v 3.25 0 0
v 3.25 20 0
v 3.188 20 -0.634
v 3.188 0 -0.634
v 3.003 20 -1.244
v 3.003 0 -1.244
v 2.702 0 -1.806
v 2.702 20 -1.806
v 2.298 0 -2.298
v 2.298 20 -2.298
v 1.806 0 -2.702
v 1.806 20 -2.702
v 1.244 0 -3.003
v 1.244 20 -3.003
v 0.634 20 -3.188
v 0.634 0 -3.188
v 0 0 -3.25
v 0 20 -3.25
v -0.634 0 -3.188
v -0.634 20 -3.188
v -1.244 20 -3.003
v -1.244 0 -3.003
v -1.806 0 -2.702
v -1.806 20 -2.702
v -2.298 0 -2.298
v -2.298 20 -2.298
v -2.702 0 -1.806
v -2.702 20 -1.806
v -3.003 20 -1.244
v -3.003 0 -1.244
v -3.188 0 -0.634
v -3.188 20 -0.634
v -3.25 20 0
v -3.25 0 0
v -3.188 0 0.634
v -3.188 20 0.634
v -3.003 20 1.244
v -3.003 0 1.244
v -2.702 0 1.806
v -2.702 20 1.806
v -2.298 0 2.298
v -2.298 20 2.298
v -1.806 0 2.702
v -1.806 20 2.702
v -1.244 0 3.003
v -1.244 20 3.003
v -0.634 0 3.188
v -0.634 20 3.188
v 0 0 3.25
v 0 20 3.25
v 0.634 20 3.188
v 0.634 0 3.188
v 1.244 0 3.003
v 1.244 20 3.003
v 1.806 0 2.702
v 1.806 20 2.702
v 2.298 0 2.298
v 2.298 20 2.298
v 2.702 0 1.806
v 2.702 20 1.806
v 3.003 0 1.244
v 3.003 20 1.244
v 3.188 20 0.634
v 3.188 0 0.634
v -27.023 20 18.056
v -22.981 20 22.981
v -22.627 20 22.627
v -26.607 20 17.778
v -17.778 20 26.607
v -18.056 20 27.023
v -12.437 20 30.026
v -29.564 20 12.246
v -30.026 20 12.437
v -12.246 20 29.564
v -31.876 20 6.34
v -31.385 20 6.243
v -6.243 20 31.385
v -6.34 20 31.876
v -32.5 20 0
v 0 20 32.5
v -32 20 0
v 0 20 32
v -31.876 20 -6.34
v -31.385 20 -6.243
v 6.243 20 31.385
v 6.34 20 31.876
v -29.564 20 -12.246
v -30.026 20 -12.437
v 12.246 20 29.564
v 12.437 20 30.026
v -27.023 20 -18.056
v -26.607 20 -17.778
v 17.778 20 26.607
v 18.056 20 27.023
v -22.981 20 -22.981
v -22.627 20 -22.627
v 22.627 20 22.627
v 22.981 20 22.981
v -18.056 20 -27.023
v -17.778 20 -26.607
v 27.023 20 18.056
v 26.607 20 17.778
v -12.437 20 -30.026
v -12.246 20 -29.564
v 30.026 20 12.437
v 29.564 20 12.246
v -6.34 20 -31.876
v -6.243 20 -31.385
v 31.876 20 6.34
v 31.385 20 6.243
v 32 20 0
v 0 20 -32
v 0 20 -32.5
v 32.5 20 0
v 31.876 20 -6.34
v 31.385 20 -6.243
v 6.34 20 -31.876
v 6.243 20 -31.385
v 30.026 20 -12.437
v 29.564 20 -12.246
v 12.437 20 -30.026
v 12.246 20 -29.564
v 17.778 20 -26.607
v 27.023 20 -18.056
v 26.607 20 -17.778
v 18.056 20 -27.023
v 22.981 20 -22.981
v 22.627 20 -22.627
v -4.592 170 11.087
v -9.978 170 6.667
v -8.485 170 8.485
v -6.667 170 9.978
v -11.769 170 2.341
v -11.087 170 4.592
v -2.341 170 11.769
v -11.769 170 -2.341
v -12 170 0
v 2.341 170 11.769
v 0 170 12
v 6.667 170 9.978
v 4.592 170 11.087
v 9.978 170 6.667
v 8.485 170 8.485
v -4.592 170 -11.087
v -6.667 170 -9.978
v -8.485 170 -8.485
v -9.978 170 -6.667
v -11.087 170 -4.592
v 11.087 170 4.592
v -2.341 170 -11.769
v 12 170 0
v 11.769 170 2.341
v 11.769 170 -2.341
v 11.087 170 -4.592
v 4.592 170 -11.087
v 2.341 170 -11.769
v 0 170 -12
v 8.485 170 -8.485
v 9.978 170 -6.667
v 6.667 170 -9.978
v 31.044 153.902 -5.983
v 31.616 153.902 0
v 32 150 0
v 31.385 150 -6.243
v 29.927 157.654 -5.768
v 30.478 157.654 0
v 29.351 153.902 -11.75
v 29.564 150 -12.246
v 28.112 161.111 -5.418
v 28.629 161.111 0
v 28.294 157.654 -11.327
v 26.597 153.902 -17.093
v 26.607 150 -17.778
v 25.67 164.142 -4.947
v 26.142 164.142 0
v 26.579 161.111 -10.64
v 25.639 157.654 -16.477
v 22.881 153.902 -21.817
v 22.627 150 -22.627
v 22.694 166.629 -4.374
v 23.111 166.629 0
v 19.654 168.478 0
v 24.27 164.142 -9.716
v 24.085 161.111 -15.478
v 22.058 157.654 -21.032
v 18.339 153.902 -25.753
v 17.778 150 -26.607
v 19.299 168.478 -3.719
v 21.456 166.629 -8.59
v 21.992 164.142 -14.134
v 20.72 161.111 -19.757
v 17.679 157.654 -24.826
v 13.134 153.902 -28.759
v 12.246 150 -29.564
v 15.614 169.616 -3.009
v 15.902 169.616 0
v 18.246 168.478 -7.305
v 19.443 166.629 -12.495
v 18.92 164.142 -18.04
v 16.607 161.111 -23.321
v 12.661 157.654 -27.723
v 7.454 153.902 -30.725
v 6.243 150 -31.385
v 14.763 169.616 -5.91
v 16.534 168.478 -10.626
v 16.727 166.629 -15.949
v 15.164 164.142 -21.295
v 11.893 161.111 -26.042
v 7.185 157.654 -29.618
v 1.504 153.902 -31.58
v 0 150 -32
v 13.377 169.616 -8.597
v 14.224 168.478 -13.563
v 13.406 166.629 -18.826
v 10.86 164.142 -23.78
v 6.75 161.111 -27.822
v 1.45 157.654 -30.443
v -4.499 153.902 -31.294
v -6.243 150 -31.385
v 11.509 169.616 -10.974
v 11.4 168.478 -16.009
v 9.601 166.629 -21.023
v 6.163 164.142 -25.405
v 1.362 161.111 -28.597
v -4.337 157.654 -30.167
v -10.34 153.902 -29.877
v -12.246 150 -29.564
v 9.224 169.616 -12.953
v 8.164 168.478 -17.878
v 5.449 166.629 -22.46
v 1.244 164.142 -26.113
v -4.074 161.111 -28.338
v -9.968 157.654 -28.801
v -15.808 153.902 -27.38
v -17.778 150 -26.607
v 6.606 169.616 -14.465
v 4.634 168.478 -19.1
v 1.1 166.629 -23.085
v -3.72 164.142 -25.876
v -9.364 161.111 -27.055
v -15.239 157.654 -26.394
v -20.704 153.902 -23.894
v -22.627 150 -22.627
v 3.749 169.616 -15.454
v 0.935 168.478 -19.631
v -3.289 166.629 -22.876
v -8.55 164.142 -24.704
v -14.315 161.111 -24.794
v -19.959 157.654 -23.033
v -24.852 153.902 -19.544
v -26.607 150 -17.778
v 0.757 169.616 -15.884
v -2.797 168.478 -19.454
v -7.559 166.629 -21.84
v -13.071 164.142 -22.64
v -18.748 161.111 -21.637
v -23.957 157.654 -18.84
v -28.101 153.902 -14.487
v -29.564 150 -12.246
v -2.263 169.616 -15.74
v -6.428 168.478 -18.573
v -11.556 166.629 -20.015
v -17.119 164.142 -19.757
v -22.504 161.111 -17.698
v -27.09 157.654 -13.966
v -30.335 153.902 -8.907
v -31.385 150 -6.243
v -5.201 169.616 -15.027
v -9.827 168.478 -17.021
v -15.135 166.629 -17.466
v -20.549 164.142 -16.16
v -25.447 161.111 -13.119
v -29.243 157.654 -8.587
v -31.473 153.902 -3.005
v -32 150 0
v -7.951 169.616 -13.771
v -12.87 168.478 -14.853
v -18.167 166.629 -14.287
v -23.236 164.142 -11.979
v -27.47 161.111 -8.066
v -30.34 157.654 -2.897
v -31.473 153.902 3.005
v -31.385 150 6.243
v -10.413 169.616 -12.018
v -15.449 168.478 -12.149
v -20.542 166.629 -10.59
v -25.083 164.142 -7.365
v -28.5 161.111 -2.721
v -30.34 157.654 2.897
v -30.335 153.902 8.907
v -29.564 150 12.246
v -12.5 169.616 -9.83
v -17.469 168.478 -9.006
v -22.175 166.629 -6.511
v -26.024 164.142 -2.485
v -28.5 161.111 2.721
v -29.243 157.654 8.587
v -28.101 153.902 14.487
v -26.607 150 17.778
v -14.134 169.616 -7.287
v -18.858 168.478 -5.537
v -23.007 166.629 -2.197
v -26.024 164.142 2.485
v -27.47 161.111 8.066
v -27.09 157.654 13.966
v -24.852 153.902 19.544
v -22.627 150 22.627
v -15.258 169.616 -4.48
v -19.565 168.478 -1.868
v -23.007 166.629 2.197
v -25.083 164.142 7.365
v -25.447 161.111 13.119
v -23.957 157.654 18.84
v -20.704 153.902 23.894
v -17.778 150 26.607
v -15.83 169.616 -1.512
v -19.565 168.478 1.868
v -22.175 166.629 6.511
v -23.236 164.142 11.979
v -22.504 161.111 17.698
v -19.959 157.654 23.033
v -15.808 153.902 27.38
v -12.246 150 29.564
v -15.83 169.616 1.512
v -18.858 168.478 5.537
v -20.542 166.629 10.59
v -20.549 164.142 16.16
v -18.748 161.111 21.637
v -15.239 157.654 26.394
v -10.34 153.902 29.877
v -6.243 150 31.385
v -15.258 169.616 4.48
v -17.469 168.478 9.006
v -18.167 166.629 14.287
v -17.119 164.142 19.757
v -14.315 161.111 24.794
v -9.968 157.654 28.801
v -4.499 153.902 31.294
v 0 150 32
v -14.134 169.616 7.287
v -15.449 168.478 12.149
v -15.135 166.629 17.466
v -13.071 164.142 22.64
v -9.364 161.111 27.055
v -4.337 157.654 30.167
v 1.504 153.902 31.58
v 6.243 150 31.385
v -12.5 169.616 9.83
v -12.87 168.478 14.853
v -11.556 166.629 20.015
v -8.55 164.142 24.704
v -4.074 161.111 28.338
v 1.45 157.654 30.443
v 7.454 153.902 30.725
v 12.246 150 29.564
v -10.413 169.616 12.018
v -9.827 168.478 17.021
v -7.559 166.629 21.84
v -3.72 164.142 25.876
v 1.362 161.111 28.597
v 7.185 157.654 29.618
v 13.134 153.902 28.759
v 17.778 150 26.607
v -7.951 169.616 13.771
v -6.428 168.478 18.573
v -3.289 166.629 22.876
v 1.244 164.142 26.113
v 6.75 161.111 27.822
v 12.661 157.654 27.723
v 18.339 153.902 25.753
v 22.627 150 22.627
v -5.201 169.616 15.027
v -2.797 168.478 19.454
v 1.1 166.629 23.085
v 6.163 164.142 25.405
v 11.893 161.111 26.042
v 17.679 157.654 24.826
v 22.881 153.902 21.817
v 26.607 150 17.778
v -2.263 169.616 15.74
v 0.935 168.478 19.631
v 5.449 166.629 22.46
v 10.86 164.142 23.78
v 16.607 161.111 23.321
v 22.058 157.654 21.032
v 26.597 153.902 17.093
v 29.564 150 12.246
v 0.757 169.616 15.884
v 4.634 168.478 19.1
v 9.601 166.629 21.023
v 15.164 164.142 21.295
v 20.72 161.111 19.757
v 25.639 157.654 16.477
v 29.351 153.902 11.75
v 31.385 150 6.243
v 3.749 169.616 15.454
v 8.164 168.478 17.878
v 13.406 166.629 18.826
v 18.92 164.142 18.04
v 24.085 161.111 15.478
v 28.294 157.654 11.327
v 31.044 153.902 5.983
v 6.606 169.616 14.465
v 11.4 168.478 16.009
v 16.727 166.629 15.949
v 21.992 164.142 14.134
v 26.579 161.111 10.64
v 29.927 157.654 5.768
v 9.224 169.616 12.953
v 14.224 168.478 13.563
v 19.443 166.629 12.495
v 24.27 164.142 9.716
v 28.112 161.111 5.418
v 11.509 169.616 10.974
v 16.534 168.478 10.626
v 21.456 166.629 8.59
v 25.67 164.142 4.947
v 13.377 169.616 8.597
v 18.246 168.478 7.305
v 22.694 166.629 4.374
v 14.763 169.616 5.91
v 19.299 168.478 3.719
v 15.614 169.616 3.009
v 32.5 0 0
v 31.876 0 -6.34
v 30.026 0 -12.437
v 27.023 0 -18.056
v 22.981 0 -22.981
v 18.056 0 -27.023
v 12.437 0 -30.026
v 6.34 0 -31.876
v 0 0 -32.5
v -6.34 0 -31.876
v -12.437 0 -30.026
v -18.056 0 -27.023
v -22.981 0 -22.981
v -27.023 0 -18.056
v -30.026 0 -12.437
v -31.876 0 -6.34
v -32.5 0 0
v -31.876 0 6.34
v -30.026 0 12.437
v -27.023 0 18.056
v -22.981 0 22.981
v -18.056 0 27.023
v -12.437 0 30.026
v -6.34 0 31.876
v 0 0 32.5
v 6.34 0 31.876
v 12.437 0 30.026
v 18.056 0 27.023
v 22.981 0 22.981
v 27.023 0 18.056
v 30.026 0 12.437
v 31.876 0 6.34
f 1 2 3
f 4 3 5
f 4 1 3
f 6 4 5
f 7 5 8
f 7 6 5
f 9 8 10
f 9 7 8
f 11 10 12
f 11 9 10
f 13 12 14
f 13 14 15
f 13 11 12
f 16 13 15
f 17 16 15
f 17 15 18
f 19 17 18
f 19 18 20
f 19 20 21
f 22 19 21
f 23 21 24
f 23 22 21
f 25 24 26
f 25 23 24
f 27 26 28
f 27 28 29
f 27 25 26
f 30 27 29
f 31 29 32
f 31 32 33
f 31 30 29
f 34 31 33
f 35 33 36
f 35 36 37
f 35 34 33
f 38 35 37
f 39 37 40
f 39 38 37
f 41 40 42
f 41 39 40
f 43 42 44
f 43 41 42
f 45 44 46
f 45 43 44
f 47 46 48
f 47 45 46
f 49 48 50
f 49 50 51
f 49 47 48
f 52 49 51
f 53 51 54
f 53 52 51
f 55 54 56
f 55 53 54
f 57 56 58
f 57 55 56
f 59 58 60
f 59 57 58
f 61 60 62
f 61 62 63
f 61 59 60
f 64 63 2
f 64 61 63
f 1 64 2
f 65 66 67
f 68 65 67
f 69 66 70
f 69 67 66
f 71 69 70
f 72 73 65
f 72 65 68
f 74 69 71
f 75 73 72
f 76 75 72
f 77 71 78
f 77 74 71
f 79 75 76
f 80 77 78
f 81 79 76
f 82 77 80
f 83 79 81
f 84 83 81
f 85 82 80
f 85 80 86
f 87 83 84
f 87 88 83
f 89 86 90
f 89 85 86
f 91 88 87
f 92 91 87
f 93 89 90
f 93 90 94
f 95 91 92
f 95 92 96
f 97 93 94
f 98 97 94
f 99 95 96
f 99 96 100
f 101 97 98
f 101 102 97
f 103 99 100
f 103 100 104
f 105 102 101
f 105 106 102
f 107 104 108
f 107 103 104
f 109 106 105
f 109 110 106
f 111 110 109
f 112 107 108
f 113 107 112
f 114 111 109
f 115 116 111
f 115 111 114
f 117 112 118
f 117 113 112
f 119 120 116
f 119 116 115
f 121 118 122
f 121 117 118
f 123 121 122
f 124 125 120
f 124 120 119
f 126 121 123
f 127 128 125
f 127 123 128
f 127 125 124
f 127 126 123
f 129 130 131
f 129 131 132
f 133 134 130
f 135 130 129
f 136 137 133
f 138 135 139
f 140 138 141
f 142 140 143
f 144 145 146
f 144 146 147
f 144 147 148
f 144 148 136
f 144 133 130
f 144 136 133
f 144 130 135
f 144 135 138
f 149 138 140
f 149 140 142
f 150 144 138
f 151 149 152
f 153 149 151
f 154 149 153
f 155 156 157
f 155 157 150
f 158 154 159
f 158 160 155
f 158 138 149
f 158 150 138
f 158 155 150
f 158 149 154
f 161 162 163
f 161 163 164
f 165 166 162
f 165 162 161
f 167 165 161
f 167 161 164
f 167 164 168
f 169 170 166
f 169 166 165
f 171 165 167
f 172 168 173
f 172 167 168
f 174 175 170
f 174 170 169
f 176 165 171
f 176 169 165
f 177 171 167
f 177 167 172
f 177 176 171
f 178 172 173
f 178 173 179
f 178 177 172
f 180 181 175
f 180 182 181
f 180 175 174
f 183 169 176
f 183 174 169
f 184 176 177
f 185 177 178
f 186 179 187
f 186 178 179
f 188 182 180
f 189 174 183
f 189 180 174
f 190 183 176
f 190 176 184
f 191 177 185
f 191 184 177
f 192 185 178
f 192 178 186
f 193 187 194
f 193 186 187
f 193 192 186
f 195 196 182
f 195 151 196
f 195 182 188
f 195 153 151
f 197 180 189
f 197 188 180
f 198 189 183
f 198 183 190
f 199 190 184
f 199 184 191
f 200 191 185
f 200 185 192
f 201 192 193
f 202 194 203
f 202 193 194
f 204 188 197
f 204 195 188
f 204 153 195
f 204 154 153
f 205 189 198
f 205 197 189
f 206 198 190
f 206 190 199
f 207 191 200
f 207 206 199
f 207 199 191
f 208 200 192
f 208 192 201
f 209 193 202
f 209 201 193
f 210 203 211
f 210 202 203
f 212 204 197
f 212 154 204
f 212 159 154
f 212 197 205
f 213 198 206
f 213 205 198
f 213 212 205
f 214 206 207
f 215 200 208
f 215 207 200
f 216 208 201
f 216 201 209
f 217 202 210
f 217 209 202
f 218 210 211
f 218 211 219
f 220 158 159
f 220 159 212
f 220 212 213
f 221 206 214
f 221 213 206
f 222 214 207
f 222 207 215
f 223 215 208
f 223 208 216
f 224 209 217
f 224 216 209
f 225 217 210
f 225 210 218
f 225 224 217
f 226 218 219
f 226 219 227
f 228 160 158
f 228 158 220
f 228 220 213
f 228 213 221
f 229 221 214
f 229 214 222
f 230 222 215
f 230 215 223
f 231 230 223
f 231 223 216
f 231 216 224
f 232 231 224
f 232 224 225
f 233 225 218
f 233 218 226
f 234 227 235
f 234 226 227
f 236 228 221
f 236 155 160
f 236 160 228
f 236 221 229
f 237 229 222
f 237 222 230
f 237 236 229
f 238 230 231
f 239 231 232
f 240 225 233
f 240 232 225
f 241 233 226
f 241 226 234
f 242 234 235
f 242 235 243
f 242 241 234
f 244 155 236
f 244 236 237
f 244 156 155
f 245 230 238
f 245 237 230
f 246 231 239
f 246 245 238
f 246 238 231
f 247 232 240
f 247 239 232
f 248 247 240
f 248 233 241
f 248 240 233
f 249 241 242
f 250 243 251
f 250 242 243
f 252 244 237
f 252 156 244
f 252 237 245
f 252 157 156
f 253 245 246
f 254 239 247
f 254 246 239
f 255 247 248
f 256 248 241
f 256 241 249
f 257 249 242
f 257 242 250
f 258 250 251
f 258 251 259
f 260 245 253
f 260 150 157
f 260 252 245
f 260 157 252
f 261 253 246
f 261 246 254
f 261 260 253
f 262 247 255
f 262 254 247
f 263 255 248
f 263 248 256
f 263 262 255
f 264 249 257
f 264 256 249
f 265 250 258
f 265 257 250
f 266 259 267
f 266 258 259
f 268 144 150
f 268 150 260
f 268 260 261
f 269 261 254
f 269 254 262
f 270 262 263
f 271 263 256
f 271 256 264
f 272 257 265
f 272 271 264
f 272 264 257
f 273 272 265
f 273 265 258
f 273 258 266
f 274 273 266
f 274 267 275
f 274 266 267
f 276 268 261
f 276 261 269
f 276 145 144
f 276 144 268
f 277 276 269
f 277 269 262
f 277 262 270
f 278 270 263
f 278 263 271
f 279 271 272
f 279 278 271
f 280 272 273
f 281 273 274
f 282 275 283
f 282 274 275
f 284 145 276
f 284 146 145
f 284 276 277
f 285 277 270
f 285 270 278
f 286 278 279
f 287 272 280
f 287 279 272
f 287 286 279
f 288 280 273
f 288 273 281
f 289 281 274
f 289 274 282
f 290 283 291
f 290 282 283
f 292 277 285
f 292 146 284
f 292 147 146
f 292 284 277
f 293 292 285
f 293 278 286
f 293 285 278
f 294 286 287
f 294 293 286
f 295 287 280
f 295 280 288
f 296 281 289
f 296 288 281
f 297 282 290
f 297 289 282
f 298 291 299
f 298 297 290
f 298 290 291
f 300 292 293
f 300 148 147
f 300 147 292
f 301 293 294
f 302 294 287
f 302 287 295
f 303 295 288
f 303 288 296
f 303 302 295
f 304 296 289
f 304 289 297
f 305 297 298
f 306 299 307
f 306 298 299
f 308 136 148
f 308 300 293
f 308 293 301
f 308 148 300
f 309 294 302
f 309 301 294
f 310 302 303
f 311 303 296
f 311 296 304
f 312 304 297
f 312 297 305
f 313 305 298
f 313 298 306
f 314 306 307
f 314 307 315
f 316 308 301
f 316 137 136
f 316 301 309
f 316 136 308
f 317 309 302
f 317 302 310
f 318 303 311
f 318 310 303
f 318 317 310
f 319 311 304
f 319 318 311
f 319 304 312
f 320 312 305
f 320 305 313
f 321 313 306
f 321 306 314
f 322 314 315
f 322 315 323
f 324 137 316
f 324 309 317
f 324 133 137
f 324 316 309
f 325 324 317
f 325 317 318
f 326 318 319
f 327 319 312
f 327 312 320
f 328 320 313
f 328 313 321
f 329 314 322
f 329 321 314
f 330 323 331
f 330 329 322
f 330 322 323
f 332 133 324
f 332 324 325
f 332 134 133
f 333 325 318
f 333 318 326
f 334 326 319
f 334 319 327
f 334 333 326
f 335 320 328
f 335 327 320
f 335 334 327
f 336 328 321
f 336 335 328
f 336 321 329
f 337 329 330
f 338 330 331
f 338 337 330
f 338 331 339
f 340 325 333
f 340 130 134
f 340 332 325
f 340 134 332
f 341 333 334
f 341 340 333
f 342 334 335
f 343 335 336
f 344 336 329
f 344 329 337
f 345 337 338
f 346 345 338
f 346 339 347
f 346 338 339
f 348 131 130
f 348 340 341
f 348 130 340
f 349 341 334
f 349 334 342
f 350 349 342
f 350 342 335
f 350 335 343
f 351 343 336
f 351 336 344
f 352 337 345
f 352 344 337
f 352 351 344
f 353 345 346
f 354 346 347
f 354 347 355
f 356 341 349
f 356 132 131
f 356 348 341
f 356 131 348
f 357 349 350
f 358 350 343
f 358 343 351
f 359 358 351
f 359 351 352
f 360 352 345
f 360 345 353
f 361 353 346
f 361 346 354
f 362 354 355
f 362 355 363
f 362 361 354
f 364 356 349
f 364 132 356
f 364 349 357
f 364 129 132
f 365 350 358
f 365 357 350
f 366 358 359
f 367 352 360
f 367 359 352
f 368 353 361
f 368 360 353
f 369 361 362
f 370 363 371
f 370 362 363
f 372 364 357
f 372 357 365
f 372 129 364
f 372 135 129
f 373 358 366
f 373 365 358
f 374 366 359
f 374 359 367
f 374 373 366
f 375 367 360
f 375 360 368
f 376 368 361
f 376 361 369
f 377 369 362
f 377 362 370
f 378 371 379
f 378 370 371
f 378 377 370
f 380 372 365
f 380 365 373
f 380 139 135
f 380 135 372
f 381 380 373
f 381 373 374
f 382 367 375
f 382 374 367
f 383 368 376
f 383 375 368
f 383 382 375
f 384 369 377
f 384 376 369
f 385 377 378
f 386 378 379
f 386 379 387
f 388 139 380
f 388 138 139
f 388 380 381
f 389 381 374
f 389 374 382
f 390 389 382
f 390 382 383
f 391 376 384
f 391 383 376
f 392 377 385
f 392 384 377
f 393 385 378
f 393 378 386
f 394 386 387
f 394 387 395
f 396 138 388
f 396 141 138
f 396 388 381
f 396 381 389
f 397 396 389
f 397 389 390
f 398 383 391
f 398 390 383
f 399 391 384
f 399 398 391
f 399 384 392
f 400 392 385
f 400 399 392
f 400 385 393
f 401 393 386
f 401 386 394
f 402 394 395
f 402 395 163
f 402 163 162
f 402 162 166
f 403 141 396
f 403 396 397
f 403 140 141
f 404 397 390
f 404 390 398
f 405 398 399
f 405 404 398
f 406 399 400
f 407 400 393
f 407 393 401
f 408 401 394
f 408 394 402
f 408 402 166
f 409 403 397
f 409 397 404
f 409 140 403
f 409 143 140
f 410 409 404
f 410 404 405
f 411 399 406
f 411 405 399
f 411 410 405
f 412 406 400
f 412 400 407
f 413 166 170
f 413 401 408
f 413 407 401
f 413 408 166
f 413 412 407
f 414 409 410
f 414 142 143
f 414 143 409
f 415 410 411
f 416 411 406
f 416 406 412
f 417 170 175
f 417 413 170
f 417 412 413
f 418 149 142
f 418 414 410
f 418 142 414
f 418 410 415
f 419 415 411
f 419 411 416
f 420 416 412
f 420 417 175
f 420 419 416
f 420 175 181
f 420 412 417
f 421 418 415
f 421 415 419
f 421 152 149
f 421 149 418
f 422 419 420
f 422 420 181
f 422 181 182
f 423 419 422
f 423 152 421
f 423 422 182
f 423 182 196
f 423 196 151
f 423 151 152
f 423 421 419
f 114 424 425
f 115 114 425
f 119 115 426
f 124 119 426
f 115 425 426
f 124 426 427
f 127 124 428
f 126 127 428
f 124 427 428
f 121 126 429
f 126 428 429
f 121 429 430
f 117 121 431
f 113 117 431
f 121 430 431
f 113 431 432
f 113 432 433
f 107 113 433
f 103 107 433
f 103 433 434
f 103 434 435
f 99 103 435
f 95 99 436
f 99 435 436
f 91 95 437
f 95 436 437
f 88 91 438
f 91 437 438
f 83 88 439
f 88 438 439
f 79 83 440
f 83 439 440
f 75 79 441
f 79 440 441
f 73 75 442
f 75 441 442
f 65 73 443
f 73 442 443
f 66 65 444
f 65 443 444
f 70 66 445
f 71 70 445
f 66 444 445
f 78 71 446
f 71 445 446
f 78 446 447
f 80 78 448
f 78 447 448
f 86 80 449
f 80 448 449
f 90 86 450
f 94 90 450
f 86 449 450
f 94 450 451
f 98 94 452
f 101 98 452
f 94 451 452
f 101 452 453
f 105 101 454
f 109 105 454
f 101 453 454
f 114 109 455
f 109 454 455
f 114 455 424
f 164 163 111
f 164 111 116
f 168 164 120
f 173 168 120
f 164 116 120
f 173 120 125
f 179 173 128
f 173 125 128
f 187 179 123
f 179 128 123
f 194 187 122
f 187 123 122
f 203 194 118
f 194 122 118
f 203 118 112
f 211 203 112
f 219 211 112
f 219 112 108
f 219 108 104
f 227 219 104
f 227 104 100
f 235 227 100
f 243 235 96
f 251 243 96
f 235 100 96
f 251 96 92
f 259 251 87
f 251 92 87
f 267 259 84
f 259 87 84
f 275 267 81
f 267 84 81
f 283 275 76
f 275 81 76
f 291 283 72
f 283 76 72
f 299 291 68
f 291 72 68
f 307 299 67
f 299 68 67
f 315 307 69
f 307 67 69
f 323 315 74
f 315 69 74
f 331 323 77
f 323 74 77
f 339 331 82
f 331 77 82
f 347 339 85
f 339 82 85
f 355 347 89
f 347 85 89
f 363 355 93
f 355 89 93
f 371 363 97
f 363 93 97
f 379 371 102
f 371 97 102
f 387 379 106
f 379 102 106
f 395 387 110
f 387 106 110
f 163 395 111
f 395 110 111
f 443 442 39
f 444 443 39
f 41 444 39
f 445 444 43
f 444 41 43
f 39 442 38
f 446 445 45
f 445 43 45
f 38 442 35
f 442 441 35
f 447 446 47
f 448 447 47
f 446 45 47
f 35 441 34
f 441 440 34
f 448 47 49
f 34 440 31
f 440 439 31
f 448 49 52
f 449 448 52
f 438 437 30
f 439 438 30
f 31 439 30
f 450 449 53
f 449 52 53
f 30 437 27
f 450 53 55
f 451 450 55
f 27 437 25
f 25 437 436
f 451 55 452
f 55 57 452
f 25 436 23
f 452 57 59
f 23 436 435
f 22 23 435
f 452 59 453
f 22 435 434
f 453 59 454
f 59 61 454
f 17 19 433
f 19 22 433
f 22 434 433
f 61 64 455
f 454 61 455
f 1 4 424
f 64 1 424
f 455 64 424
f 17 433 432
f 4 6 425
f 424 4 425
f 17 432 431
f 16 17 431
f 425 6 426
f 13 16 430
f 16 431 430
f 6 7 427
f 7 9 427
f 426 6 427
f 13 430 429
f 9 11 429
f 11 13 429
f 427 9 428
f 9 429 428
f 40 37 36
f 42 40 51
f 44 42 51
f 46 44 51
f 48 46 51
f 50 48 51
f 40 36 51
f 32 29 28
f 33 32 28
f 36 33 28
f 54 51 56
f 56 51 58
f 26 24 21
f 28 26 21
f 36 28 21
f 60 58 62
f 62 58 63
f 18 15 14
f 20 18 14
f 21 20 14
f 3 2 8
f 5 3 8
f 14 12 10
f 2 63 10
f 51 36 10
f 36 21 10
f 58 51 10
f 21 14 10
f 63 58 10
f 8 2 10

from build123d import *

# Parameters (mm, degrees)
ESQUISSE1_R        = 32.5
ESQUISSE1_R_2      = 3.25
BOSS_EXTRU_1_DEPTH = 20
ESQUISSE2_R        = 32
BOSS_EXTRU_2_DEPTH = 150
CONG_1_R           = 20


with BuildPart() as part:
    # Esquisse1 → Boss.-Extru.1 (new body)
    with BuildSketch(Plane(origin=(0, 0, 0), x_dir=(1, 0, 0), z_dir=(0, 1, 0))):
        Circle(ESQUISSE1_R)
        Circle(ESQUISSE1_R_2, mode=Mode.SUBTRACT)
    extrude(amount=BOSS_EXTRU_1_DEPTH)

    # Esquisse2 → Boss.-Extru.2 (add)
    with BuildSketch(Plane(origin=(0, 20, 0), x_dir=(1, 0, 0), z_dir=(0, 1, 0))):
        Circle(ESQUISSE2_R)
    extrude(amount=BOSS_EXTRU_2_DEPTH)

    # Congé1
    cong_1_edges = [part.edges().sort_by_distance(p)[0] for p in [
        (-32, 170, 0),
    ]]
    fillet(cong_1_edges, radius=CONG_1_R)


solid = part.part
